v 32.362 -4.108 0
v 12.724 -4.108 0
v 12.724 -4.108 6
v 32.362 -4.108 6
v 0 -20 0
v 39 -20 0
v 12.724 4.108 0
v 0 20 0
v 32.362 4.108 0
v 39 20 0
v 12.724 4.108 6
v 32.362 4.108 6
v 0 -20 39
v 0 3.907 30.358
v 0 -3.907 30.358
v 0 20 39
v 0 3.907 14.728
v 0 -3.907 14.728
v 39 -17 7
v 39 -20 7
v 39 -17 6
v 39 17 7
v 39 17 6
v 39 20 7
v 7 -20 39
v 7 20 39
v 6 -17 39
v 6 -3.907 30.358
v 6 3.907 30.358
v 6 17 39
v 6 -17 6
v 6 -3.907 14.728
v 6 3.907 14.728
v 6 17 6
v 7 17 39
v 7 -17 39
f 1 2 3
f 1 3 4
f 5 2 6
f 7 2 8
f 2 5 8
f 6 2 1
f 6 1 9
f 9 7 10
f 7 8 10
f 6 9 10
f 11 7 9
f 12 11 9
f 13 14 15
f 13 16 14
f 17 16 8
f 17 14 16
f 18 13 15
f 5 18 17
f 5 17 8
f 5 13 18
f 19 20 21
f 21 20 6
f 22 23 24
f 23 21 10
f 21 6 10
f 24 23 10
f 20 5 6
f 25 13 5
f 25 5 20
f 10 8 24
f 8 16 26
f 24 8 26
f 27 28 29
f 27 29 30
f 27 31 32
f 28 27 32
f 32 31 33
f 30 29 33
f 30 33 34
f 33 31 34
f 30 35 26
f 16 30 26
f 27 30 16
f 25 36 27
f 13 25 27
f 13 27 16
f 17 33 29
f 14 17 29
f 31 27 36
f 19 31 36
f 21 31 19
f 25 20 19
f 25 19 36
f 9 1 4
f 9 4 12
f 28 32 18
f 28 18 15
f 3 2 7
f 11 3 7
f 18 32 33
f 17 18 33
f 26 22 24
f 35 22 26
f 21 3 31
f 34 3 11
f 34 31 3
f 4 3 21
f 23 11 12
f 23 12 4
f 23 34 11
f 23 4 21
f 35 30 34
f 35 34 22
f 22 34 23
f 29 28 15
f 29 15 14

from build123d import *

# Parameters (mm, degrees)
F1_DEPTH = 20
F2_W     = 33
F2_H     = 34
F3_DEPTH = 39.001
F4_DEPTH = 6
F5_W     = 7.814886
F5_H     = 15.629771
F6_DEPTH = 25
F7_W     = 19.637413
F7_H     = 8.21565
F8_DEPTH = 39.001


with BuildPart() as f1:
    # F0 (on Front) → F1 (new body, symmetric)
    with BuildSketch(Plane.XZ):
        Polygon((0, 39), (0, 0), (39, 0), (39, 7), (7, 39), align=None)
    extrude(amount=F1_DEPTH, both=True)

    # F2 (on Top) → F3 (cut, through all)
    with BuildSketch(Plane.XY):
        with Locations((22.5, 0)):
            Rectangle(F2_W, F2_H)
    extrude(amount=F3_DEPTH, mode=Mode.SUBTRACT)

    # F2 (on Top) → F4 (join)
    with BuildSketch(Plane.XY):
        with Locations((22.5, 0)):
            Rectangle(F2_W, F2_H)
    extrude(amount=F4_DEPTH)

    # F5 (on face) → F6 (cut)
    with BuildSketch(Plane.YZ.offset(6)):
        with Locations((0, 22.542938)):
            Rectangle(F5_W, F5_H)
    extrude(amount=-F6_DEPTH, mode=Mode.SUBTRACT)

    # F7 (on Top) → F8 (cut, through all)
    with BuildSketch(Plane.XY):
        with Locations((22.542938, 0)):
            Rectangle(F7_W, F7_H)
    extrude(amount=F8_DEPTH, mode=Mode.SUBTRACT)


solid = f1.part
